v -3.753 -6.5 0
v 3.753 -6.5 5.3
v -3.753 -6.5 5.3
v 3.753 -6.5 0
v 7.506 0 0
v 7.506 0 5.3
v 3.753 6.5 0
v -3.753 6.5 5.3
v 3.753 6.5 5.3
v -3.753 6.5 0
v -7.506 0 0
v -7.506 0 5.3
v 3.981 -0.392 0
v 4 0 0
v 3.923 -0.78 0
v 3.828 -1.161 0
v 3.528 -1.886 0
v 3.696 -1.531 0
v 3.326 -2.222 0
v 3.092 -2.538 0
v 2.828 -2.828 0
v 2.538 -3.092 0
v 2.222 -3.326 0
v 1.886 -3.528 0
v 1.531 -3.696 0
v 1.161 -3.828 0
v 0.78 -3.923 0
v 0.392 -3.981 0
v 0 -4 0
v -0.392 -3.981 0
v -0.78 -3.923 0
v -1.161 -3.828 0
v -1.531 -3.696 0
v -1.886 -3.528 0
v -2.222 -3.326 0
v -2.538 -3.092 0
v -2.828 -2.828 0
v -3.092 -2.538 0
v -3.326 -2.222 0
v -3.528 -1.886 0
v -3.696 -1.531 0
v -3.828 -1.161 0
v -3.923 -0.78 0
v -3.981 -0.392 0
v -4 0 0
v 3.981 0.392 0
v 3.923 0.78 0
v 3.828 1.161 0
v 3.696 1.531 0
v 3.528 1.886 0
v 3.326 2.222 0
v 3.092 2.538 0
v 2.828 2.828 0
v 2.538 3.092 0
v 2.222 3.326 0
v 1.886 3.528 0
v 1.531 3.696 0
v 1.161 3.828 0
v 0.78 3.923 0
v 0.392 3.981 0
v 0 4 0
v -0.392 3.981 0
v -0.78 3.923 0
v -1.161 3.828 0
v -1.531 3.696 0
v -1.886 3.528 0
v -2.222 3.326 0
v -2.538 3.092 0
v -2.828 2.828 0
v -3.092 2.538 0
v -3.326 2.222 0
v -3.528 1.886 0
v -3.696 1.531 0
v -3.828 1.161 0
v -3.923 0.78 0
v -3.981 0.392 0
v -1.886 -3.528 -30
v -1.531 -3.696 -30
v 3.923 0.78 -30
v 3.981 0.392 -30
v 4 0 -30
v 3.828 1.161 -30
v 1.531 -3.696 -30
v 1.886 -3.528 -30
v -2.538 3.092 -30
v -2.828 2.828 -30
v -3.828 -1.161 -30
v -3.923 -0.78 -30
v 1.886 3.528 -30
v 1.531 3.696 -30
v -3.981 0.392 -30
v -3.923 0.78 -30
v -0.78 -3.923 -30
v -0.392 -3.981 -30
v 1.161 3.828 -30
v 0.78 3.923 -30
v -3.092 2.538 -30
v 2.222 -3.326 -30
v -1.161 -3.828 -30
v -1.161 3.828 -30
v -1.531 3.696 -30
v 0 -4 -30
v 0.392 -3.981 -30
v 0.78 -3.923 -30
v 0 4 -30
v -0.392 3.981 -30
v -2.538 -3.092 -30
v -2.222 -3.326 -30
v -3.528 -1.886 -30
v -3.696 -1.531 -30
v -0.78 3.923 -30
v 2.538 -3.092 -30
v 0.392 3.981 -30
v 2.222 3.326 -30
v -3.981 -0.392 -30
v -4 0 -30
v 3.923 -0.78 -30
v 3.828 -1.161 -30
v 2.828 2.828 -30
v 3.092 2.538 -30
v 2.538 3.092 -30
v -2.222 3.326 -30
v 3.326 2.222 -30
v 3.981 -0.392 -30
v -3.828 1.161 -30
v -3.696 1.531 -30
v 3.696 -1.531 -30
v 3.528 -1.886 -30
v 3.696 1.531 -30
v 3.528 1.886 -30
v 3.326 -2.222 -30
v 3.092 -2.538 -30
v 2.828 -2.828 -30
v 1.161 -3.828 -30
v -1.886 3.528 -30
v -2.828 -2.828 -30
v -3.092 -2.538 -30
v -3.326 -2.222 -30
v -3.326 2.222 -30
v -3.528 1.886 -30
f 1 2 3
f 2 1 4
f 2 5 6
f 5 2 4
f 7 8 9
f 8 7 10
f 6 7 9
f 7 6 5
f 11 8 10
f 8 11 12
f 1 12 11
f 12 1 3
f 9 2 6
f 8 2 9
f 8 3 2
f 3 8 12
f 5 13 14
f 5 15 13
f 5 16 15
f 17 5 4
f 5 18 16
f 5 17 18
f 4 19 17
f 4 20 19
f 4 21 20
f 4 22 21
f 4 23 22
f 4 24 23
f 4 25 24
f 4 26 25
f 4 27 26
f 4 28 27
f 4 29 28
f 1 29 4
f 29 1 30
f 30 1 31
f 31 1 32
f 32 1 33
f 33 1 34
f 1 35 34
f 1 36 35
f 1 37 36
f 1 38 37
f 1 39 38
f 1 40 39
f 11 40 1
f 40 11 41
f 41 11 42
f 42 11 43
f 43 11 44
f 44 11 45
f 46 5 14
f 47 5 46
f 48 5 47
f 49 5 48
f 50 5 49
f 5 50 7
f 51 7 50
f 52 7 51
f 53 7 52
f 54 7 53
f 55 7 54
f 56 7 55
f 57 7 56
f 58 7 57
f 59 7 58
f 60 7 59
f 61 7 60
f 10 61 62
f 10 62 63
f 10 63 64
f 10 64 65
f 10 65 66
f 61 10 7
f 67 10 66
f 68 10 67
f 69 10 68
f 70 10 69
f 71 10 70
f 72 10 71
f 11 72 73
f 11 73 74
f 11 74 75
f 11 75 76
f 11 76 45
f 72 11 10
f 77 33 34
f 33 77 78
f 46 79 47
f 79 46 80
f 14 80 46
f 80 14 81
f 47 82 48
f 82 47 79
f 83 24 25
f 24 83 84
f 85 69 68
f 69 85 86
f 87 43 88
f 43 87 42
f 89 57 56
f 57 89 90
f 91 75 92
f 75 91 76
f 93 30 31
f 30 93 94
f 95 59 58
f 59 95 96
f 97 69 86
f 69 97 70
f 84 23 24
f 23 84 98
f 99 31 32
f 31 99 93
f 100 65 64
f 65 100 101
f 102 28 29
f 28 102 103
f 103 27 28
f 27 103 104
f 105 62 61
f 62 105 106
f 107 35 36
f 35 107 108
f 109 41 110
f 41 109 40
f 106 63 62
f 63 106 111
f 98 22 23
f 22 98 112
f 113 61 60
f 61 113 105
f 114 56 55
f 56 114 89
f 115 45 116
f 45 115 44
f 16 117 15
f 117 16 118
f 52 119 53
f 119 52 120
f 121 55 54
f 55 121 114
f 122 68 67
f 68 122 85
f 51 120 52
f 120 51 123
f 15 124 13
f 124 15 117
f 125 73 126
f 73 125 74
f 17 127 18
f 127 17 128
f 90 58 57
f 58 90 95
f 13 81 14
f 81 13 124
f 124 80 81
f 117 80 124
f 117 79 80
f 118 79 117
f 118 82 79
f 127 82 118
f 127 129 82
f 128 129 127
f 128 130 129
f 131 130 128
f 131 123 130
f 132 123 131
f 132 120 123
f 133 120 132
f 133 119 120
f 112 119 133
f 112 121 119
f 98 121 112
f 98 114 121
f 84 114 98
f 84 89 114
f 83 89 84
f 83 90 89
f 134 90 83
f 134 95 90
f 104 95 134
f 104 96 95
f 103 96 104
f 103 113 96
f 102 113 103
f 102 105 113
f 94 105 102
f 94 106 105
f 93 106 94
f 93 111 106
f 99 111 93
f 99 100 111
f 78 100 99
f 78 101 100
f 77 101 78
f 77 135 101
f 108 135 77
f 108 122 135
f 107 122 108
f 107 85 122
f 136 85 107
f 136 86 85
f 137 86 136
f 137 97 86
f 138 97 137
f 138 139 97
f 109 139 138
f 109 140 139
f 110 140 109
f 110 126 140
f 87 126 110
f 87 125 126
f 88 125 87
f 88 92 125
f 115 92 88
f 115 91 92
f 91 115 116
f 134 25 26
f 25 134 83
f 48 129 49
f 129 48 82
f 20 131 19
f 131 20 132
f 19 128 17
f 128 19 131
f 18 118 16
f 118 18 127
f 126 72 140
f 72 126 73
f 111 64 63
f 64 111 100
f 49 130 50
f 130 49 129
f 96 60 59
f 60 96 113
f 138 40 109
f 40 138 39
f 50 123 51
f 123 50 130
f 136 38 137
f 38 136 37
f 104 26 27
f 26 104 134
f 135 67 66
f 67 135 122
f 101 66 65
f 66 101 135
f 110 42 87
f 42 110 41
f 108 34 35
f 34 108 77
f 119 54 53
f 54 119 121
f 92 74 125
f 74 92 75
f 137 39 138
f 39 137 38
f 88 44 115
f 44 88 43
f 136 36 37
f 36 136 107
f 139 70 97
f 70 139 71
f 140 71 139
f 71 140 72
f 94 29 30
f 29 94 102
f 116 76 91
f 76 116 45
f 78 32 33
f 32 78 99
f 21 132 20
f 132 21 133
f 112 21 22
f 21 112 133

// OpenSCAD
// M8 六角ボルト(ねじ山省略)
// 頭部: 対辺距離 13mm, 高さ 5.3mm
// シャンク: 直径 8mm, 長さ 30mm

af = 13;        // 頭部の対辺距離 (across-flats)
head_h = 5.3;   // 頭部の高さ
shank_d = 8;    // シャンク直径
shank_l = 30;   // シャンク長さ

$fn = 64;

// 頭部(六角柱): 対辺距離から外接円半径を計算
// 六角形の外接円半径 = (対辺距離 / 2) / cos(30°)
head_r = (af / 2) / cos(30);

union() {
    // 頭部: 底面が z=0
    cylinder(h = head_h, r = head_r, $fn = 6);

    // シャンク: z=0 から z=-30 へ
    translate([0, 0, -shank_l])
        cylinder(h = shank_l, d = shank_d);
}
